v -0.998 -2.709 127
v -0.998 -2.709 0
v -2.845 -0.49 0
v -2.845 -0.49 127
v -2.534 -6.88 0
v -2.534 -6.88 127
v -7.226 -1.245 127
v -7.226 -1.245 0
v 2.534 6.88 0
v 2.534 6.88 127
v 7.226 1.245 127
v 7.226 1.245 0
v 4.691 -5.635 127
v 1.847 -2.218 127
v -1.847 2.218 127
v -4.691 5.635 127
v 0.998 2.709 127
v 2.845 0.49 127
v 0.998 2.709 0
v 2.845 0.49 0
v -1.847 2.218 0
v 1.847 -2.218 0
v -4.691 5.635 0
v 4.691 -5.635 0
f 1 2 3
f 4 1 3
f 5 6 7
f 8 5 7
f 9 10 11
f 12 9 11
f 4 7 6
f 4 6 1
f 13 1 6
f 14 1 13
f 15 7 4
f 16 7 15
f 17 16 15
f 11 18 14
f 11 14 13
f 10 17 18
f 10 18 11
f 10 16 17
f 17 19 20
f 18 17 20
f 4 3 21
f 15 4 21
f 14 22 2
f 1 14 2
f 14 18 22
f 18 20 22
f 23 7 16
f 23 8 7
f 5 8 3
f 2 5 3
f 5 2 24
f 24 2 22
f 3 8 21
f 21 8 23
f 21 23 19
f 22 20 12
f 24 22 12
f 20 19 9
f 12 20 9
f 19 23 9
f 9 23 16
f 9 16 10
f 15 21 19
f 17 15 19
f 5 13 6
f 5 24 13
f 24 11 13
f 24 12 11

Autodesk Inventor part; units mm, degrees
ref_plane "YZ Plane" through (0, 0, 0) normal (1, 0, 0) x (0, 1, 0)
ref_plane "XZ Plane" through (0, 0, 0) normal (0, 1, 0) x (-1, 0, 0)
ref_plane "XY Plane" through (0, 0, 0) normal (0, 0, 1) x (1, 0, 0)
sketch "Sketch1" plane through (0, 0, 0) normal (0, 0, 1) x (1, 0, 0)
  line L0 (2.5344, 6.8804) -> (7.2258, 1.2453)
  line L1 (7.2258, 1.2453) -> (4.6914, -5.6351)
  line L2 (4.6914, -5.6351) -> (-2.5344, -6.8804)
  line L3 (-2.5344, -6.8804) -> (-7.2258, -1.2453)
  line L4 (-7.2258, -1.2453) -> (-4.6914, 5.6351)
  line L5 (-4.6914, 5.6351) -> (2.5344, 6.8804)
  line L6 (-1.847, 2.2185) -> (0.9978, 2.7088)
  line L7 (0.9978, 2.7088) -> (2.8448, 0.4903)
  line L8 (2.8448, 0.4903) -> (1.847, -2.2185)
  line L9 (1.847, -2.2185) -> (-0.9978, -2.7088)
  line L10 (-0.9978, -2.7088) -> (-2.8448, -0.4903)
  line L11 (-2.8448, -0.4903) -> (-1.847, 2.2185)
  point P0 (0, 0)
  point P1 (0, 0)
  point P2 (0, 0)
  dimension "d0" = 12.7
  dimension "d1" = 5
extrude "Extrusion1" add sketch "Sketch1" along normal blind 127
properties part number "cross beam"
